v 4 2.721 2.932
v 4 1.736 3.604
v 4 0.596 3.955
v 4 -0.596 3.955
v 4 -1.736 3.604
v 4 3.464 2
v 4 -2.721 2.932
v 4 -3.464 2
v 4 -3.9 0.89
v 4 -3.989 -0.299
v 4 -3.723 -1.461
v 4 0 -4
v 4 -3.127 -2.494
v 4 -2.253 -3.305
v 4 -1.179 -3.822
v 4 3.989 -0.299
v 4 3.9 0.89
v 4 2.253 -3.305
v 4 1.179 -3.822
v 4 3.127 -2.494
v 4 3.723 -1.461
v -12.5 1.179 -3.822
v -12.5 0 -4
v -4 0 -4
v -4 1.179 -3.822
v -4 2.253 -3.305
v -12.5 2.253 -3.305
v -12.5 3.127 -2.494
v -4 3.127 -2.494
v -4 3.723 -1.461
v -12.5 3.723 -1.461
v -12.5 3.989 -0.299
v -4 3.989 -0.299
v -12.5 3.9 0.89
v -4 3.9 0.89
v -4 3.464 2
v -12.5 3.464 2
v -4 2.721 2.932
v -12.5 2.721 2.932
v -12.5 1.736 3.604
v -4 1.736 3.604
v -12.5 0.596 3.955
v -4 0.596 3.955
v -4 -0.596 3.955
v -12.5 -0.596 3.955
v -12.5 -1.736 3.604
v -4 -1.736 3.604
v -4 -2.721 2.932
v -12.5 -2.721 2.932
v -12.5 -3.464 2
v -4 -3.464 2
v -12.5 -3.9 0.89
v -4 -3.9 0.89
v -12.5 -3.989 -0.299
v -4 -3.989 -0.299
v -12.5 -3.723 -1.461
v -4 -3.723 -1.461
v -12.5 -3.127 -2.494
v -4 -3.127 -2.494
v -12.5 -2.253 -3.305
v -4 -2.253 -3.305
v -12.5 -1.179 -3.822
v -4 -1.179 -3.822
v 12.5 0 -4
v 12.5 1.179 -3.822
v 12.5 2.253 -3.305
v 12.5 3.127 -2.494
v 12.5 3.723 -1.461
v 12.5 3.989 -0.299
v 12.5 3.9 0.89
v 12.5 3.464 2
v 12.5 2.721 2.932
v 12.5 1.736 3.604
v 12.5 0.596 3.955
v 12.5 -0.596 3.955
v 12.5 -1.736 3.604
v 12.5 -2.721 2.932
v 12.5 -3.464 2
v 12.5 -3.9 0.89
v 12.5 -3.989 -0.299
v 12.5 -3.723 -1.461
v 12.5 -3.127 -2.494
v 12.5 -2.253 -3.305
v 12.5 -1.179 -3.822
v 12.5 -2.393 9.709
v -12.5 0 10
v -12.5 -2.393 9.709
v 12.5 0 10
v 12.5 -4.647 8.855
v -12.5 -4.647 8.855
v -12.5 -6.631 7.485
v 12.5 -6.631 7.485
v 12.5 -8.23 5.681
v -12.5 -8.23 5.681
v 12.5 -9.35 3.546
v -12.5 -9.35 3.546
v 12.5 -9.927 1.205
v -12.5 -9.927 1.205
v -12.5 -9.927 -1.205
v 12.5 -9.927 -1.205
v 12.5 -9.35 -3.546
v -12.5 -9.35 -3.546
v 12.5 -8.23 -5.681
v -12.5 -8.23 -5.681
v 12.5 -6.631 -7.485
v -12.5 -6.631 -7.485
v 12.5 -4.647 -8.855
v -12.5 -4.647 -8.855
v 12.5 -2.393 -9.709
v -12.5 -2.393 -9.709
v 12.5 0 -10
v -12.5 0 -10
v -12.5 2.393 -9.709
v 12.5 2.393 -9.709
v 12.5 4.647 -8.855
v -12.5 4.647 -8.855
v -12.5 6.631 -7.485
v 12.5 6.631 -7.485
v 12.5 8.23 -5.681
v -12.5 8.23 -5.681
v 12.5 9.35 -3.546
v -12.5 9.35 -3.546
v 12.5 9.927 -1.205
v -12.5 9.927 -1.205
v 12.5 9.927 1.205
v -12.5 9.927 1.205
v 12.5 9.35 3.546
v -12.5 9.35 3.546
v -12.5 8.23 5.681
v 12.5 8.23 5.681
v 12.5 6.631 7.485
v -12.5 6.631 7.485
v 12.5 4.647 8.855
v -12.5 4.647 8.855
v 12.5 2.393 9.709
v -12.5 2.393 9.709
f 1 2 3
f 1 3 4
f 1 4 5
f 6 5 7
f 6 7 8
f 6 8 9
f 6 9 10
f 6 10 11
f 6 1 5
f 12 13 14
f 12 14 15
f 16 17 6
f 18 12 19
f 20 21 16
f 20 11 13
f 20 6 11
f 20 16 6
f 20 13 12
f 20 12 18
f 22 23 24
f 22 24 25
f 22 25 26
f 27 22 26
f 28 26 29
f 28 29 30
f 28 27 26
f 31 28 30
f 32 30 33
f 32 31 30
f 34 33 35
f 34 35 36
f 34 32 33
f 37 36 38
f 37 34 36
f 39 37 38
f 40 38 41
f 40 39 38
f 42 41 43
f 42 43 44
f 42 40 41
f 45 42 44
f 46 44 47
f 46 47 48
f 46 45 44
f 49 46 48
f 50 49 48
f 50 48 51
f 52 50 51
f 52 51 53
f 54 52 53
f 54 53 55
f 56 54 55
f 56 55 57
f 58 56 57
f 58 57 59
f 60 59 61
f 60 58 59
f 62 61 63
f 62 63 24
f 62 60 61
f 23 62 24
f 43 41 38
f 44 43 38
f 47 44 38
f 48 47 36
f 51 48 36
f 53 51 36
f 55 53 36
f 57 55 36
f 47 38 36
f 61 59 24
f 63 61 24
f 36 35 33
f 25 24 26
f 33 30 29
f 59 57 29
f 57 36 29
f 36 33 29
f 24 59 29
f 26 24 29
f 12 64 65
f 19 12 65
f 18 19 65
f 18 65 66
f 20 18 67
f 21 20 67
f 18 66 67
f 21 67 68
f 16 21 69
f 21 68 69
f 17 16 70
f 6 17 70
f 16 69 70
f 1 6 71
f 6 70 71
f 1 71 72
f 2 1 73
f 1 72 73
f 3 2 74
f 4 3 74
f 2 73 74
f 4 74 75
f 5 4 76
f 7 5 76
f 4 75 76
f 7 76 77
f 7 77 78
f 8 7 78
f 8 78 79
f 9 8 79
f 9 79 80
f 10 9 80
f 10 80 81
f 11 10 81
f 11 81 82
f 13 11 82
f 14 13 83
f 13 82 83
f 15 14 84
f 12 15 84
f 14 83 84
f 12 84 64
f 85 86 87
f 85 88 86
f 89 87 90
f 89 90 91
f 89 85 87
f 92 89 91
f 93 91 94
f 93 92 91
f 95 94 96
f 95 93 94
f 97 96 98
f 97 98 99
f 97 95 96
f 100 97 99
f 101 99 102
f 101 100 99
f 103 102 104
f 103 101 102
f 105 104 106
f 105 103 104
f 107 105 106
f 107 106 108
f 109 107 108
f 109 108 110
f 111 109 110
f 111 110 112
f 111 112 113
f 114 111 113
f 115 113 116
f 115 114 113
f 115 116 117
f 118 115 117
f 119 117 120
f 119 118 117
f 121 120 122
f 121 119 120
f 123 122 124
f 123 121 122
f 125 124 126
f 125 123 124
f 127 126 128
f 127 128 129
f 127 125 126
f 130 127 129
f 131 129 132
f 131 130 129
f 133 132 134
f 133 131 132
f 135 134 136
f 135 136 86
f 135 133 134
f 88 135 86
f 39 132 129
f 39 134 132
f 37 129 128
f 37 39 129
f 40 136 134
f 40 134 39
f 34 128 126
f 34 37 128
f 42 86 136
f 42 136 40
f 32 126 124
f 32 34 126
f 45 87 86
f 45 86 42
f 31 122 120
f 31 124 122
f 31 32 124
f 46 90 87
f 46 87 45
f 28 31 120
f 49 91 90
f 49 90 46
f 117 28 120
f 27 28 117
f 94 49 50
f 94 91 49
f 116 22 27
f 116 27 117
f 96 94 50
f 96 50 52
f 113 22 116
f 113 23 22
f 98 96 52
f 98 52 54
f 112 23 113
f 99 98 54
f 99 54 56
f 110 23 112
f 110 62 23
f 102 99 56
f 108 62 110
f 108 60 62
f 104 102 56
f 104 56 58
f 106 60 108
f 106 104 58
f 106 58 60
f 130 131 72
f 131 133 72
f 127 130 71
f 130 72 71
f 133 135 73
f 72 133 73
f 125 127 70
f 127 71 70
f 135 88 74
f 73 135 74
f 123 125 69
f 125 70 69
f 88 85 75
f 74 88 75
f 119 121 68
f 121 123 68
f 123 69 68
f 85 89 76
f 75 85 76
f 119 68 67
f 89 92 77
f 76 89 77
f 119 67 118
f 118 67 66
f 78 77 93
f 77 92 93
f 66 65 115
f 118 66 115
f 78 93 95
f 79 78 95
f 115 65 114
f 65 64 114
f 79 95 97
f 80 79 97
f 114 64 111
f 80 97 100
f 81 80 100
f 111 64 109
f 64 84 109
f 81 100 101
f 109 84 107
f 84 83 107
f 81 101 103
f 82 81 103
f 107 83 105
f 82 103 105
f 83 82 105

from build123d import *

# Parameters (mm, degrees)
SKETCH_1_W          = 25
SKETCH_1_H          = 10
SKETCH_2_R          = 4
CUT_EXTRUDE_1_DEPTH = 8.5


with BuildPart() as part:
    # 草图1 → 旋转1 (revolve)
    with BuildSketch(Plane.XY, mode=Mode.PRIVATE) as revolve_1_sk:
        with Locations((0, 5)):
            Rectangle(SKETCH_1_W, SKETCH_1_H)
    revolve(revolve_1_sk.sketch.rotate(Axis((-12.5, 0, 0), (1, 0, 0)), 90), axis=Axis((-12.5, 0, 0), (1, 0, 0)))

    # 草图2 → 切除-拉伸1 (cut)
    with BuildSketch(Plane(origin=(12.5, 0, 0), x_dir=(0, 0, -1), z_dir=(1, 0, 0))):
        Circle(SKETCH_2_R)
    cut_extrude_1 = extrude(amount=-CUT_EXTRUDE_1_DEPTH, mode=Mode.SUBTRACT)

    # 镜向1: 切除-拉伸1 across plane
    add(cut_extrude_1.mirror(Plane(origin=(0, 0, 0), x_dir=(0, 0, 1), z_dir=(1, 0, 0))), mode=Mode.SUBTRACT)


solid = part.part
